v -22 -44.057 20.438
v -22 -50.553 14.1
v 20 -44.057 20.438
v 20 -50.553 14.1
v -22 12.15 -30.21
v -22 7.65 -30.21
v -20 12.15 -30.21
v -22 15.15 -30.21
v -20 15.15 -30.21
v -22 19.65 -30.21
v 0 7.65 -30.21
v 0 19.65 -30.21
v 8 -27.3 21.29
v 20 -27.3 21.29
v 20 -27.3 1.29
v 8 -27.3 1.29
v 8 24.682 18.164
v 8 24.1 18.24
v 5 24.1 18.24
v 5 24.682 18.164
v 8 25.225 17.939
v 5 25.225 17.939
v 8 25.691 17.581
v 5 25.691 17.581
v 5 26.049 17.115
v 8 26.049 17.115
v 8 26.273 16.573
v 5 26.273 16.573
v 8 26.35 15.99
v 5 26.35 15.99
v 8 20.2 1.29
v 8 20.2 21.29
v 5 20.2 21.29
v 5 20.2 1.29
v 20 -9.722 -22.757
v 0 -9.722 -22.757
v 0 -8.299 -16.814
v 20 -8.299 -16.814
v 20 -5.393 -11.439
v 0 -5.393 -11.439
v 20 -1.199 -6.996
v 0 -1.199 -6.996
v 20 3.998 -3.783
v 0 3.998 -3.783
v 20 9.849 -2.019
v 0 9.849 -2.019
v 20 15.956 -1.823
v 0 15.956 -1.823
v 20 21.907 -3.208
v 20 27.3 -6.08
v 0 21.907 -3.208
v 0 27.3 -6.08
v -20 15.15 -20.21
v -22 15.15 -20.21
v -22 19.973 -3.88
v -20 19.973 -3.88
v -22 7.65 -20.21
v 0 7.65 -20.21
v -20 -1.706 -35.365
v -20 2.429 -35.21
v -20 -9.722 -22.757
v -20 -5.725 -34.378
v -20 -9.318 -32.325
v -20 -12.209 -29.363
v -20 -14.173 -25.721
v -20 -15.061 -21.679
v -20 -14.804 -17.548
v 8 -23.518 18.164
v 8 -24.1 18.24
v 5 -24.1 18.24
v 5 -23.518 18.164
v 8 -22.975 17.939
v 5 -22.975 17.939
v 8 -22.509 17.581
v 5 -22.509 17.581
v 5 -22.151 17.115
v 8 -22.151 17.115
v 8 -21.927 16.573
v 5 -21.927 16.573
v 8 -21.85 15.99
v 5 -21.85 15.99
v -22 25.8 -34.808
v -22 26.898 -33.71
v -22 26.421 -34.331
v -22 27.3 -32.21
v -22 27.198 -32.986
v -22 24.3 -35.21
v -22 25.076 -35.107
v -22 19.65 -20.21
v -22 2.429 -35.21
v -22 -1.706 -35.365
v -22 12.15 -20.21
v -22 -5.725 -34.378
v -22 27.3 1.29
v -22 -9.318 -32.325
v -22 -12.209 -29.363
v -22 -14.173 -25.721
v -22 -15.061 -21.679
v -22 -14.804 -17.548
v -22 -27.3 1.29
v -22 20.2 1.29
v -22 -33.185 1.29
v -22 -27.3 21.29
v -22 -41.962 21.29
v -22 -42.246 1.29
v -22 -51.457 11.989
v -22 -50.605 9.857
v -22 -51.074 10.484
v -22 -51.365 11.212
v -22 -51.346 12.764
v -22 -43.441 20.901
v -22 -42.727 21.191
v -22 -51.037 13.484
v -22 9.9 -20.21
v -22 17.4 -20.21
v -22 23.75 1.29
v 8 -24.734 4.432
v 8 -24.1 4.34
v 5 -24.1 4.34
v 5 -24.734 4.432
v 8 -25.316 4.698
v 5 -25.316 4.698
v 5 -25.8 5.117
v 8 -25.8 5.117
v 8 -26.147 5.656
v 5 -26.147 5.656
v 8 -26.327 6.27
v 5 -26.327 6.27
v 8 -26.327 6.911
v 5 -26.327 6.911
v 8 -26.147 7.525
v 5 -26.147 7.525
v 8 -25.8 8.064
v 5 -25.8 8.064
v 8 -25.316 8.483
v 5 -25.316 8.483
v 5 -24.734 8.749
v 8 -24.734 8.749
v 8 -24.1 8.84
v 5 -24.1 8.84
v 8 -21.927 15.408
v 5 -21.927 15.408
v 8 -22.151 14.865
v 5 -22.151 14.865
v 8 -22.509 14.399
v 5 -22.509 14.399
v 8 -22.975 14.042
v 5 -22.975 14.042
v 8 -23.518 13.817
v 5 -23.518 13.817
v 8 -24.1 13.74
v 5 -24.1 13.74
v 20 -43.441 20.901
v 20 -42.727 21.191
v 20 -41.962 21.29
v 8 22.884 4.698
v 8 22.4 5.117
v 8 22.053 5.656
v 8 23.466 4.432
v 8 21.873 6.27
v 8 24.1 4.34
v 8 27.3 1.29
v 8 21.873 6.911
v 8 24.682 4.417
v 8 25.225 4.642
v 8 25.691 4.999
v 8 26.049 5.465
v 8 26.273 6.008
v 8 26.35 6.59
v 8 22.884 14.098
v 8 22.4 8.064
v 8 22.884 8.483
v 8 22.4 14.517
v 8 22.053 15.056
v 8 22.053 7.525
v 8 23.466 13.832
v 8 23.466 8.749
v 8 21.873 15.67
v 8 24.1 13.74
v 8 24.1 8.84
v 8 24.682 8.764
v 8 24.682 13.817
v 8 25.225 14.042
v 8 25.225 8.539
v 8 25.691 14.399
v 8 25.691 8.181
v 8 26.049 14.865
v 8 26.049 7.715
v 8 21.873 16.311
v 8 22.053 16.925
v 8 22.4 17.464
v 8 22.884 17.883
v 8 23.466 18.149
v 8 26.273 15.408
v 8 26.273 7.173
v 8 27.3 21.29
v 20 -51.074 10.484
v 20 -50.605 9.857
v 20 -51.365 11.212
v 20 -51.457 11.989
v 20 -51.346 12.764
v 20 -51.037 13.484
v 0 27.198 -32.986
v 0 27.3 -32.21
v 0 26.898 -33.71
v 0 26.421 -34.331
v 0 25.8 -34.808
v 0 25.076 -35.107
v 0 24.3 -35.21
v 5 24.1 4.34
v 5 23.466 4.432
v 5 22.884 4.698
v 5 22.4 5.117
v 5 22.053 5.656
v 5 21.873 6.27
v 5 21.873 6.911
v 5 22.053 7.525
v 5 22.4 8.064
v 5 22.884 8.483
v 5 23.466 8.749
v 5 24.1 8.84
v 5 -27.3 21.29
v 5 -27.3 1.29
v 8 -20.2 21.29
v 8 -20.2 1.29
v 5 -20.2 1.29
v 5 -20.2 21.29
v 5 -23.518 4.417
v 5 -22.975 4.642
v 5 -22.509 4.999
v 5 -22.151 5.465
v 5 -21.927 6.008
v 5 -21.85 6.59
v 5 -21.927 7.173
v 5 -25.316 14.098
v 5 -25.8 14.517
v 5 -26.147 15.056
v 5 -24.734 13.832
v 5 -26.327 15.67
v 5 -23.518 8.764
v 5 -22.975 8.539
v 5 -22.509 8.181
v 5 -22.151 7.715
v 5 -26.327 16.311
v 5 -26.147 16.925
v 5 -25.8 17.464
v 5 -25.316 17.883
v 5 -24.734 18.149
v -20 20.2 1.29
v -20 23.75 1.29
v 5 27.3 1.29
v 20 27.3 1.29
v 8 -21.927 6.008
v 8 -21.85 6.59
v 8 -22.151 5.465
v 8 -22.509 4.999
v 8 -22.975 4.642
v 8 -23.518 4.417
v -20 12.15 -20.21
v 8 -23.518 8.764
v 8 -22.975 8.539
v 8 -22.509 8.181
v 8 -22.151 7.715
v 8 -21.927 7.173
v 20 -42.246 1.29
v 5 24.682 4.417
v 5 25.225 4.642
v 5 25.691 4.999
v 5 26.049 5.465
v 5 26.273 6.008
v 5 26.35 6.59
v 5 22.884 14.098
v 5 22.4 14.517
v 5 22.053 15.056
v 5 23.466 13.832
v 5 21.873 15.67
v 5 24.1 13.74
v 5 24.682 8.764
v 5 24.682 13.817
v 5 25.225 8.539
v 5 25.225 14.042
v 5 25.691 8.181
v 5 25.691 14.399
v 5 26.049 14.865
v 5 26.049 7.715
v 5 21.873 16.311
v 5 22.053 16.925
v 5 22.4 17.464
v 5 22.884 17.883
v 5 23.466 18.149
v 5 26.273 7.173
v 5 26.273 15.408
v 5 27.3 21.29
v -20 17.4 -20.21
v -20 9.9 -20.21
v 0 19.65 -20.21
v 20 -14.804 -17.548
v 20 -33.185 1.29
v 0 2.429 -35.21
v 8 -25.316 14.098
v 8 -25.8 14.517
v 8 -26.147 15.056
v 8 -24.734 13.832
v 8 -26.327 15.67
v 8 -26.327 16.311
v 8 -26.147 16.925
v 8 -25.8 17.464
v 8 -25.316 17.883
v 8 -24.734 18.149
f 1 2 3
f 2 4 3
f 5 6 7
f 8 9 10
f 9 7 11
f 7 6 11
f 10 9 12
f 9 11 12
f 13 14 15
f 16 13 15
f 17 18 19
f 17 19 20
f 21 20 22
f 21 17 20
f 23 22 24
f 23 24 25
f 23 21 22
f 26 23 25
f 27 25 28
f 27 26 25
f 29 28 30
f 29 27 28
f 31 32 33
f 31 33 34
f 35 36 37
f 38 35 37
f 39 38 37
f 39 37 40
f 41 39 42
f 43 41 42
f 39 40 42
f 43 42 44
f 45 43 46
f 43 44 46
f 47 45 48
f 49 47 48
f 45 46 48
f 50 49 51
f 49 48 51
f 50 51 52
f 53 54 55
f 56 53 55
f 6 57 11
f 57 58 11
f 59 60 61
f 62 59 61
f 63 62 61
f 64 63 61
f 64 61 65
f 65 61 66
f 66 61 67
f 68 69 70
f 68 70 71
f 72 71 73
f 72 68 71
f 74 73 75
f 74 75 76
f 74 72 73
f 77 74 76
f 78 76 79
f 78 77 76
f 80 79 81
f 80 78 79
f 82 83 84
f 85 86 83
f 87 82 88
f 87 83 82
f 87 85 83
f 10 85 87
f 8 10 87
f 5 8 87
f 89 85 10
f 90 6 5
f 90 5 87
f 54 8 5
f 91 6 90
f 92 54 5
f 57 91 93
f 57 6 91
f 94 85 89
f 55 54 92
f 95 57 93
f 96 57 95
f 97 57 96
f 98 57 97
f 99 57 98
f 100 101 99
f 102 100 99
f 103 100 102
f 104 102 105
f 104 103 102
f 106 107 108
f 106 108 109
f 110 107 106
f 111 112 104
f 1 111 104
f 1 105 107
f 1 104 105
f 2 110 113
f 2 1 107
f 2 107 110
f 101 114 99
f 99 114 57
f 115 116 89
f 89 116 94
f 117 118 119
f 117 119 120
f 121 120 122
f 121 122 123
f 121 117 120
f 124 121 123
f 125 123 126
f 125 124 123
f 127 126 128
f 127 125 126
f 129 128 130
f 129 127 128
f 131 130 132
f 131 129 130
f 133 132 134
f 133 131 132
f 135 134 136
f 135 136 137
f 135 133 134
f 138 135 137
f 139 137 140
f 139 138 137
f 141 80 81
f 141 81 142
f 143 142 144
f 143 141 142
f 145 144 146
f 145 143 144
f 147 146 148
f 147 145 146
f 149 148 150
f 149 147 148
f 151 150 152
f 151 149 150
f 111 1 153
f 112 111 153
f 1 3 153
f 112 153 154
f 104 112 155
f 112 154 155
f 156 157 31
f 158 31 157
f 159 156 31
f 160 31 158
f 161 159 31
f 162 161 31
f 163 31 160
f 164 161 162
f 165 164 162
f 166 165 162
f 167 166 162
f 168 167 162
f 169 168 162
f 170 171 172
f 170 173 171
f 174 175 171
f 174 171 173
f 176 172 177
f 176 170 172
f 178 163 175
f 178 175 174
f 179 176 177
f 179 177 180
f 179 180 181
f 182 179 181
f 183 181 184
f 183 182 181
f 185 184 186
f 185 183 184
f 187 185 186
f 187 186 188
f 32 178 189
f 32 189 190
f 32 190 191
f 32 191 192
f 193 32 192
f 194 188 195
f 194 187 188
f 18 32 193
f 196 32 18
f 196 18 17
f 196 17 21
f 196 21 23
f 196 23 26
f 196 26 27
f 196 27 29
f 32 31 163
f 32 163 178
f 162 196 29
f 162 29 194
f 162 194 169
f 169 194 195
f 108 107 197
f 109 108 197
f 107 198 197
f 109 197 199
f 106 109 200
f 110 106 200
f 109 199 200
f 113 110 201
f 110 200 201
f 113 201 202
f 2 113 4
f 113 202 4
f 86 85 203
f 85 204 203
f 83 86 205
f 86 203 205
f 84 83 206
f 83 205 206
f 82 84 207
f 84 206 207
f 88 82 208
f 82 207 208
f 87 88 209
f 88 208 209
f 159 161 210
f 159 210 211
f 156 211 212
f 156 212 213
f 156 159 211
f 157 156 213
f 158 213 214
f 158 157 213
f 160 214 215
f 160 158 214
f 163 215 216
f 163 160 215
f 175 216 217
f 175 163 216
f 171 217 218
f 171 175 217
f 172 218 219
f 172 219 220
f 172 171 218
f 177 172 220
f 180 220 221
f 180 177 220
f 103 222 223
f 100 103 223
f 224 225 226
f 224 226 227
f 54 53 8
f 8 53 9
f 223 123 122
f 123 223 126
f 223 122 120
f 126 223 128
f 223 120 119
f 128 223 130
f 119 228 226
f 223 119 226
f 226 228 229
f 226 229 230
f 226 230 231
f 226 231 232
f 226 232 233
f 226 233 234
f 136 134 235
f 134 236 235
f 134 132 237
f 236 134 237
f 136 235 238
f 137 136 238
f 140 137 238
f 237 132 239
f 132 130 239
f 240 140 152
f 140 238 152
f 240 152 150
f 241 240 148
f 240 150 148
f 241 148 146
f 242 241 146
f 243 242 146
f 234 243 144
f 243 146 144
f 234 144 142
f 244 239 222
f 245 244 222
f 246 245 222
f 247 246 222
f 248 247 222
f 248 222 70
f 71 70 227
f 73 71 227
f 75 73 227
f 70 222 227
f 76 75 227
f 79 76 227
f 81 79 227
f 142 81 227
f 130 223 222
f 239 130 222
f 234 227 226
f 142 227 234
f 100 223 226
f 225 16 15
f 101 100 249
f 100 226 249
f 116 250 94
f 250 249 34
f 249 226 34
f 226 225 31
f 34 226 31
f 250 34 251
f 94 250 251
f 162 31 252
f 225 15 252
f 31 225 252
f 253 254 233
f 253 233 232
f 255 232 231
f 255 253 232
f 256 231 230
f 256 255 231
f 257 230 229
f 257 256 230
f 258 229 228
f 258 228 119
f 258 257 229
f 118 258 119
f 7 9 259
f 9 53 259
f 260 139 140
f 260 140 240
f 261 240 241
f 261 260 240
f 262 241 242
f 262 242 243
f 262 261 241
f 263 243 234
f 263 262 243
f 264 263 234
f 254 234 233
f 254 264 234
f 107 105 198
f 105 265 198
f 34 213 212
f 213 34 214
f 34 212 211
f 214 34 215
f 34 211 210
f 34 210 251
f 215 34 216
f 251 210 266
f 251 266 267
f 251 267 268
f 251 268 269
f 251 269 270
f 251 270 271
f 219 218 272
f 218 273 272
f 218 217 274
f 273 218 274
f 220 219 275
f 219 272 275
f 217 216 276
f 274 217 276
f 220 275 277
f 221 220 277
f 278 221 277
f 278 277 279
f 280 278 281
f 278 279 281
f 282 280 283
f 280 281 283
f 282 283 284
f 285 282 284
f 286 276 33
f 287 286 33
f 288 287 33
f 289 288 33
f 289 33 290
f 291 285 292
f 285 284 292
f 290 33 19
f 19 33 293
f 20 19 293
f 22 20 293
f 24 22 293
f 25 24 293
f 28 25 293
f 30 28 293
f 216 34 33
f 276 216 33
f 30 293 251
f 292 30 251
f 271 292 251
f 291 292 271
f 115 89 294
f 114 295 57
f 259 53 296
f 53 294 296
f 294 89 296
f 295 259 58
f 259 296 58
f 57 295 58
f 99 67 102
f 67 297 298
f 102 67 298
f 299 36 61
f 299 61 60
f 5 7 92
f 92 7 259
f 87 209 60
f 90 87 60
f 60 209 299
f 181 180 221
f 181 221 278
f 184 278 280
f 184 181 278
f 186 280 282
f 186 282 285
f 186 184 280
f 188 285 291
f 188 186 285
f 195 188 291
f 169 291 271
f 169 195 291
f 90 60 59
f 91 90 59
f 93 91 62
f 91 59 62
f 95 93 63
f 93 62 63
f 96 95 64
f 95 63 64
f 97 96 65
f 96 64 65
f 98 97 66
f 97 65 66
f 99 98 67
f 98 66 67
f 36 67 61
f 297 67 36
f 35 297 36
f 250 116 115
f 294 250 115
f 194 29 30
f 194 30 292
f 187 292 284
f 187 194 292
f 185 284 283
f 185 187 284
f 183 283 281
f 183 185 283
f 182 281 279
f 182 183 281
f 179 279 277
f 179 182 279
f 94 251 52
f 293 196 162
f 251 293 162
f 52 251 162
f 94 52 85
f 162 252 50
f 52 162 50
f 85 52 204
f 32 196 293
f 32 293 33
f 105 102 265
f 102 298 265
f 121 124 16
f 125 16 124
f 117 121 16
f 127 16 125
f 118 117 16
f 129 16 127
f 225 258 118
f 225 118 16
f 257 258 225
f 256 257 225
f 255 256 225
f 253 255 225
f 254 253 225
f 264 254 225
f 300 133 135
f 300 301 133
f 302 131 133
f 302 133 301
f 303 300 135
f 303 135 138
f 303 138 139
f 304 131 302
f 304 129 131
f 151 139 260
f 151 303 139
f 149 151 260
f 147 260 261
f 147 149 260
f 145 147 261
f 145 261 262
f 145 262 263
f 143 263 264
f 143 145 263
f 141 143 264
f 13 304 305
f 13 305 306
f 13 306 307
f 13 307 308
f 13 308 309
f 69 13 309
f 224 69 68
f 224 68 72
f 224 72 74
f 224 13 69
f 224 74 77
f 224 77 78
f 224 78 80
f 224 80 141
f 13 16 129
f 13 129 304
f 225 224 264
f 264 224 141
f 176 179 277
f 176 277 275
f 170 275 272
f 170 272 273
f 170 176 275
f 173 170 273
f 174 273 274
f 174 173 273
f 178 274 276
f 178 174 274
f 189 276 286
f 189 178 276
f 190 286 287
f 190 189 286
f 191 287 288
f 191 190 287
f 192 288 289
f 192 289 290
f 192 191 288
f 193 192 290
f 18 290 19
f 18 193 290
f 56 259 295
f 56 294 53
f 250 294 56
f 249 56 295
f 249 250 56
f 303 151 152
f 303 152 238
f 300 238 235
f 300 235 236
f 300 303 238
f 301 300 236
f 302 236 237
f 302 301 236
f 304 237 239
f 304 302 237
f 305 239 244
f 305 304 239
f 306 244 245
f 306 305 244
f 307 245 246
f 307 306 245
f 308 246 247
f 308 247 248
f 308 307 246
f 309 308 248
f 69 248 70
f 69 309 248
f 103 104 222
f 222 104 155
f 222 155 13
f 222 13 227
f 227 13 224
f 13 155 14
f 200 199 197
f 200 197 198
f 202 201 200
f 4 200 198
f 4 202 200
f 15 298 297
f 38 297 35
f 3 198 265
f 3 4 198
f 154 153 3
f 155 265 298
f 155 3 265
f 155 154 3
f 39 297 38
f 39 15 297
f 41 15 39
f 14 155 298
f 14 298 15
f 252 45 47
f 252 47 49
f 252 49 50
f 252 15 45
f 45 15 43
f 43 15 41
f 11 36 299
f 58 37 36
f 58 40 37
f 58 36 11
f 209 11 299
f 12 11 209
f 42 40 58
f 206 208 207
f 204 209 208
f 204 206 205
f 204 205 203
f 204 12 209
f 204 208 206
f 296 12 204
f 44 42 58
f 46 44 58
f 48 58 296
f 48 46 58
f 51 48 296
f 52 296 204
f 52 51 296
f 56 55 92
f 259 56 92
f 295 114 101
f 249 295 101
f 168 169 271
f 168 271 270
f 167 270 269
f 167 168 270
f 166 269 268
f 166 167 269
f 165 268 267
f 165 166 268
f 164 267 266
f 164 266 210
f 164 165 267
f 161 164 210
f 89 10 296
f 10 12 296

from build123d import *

# Parameters (mm, degrees)
F1_DEPTH  = 20
F0_W      = 12
F0_H      = 10
F2_DEPTH  = 20
F4_DEPTH  = 2
F8_DEPTH  = 3
F10_DEPTH = 2


with BuildPart() as f1:
    # F0 (on Right) → F1 (new body)
    with BuildSketch(Plane.YZ):
        with BuildLine():
            ThreePointArc((-9.7216395426, -22.7567306352), (3.9984194059, -3.7830302321), (27.3, -6.0803474404))
            Line((27.3, -6.0803474404), (27.3, 1.2904210016))
            Line((27.3, 1.2904210016), (20.2, 1.2904210016))
            Line((20.2, 1.2904210016), (-20.2, 1.2904210016))
            Line((-20.2, 1.2904210016), (-27.3, 1.2904210016))
            Line((-27.3, 1.2904210016), (-33.1852941176, 1.2904210016))
            Line((-33.1852941176, 1.2904210016), (-14.8038696072, -17.5481150452))
            Line((-14.8038696072, -17.5481150452), (-9.7216395426, -22.7567306352))
        make_face()
        with BuildLine():
            Line((-42.245950674, 1.2904210016), (-33.1852941176, 1.2904210016))
            Line((-33.1852941176, 1.2904210016), (-27.3, 1.2904210016))
            Line((-27.3, 1.2904210016), (-27.3, 21.2904210016))
            Line((-27.3, 21.2904210016), (-41.9619835647, 21.2904210016))
            ThreePointArc((-41.9619835647, 21.2904210016), (-43.092993443, 21.0690567559), (-44.0570932222, 20.4376321051))
            Line((-44.0570932222, 20.4376321051), (-50.5527888965, 14.0995525758))
            ThreePointArc((-50.5527888965, 14.0995525758), (-51.4574530171, 11.989182758), (-50.6048903424, 9.8572318148))
            Line((-50.6048903424, 9.8572318148), (-42.245950674, 1.2904210016))
        make_face()
    extrude(amount=F1_DEPTH)

    # F0 (on Right) → F2 (join)
    with BuildSketch(Plane.YZ):
        with BuildLine():
            ThreePointArc((-9.7216395426, -22.7567306352), (3.9984194059, -3.7830302321), (27.3, -6.0803474404))
            Line((27.3, -6.0803474404), (27.3, 1.2904210016))
            Line((27.3, 1.2904210016), (20.2, 1.2904210016))
            Line((20.2, 1.2904210016), (-20.2, 1.2904210016))
            Line((-20.2, 1.2904210016), (-27.3, 1.2904210016))
            Line((-27.3, 1.2904210016), (-33.1852941176, 1.2904210016))
            Line((-33.1852941176, 1.2904210016), (-14.8038696072, -17.5481150452))
            Line((-14.8038696072, -17.5481150452), (-9.7216395426, -22.7567306352))
        make_face()
        with BuildLine():
            ThreePointArc((24.3, -35.2095789984), (26.4213203436, -34.3308993419), (27.3, -32.2095789984))
            Line((27.3, -32.2095789984), (27.3, -6.0803474404))
            ThreePointArc((27.3, -6.0803474404), (3.9984194059, -3.7830302321), (-9.7216395426, -22.7567306352))
            Line((-9.7216395426, -22.7567306352), (2.4290441176, -35.2095789984))
            Line((2.4290441176, -35.2095789984), (24.3, -35.2095789984))
        make_face()
        with Locations((13.65, -25.2095789984)):
            Rectangle(F0_W, F0_H, mode=Mode.SUBTRACT)
        with BuildLine():
            Line((-42.245950674, 1.2904210016), (-33.1852941176, 1.2904210016))
            Line((-33.1852941176, 1.2904210016), (-27.3, 1.2904210016))
            Line((-27.3, 1.2904210016), (-27.3, 21.2904210016))
            Line((-27.3, 21.2904210016), (-41.9619835647, 21.2904210016))
            ThreePointArc((-41.9619835647, 21.2904210016), (-43.092993443, 21.0690567559), (-44.0570932222, 20.4376321051))
            Line((-44.0570932222, 20.4376321051), (-50.5527888965, 14.0995525758))
            ThreePointArc((-50.5527888965, 14.0995525758), (-51.4574530171, 11.989182758), (-50.6048903424, 9.8572318148))
            Line((-50.6048903424, 9.8572318148), (-42.245950674, 1.2904210016))
        make_face()
    extrude(amount=-F2_DEPTH)

    # F3 (on face) → F4 (join)
    with BuildSketch(Plane(origin=(-20, 0, 0), x_dir=(0, -1, 0), z_dir=(-1, 0, 0))):
        with BuildLine():
            Line((-2.4290441176, -35.2095789984), (14.8038696072, -17.5481150452))
            Line((14.8038696072, -17.5481150452), (33.1852941176, 1.2904210016))
            Line((33.1852941176, 1.2904210016), (42.245950674, 1.2904210016))
            Line((42.245950674, 1.2904210016), (50.6048903424, 9.8572318148))
            ThreePointArc((50.6048903424, 9.8572318148), (51.4574530171, 11.989182758), (50.5527888965, 14.0995525758))
            Line((50.5527888965, 14.0995525758), (44.0570932222, 20.4376321051))
            ThreePointArc((44.0570932222, 20.4376321051), (43.092993443, 21.0690567559), (41.9619835647, 21.2904210016))
            Line((41.9619835647, 21.2904210016), (27.3, 21.2904210016))
            Line((27.3, 21.2904210016), (27.3, 1.2904210016))
            Line((27.3, 1.2904210016), (-27.3, 1.2904210016))
            Line((-27.3, 1.2904210016), (-27.3, -32.2095789984))
            ThreePointArc((-27.3, -32.2095789984), (-26.4213203436, -34.3308993419), (-24.3, -35.2095789984))
            Line((-24.3, -35.2095789984), (-2.4290441176, -35.2095789984))
        make_face()
        Polygon((-19.65, -30.2095789984), (-19.65, -20.2095789984), (-15.15, -20.2095789984), (-13.65, -20.2095789984), (-12.15, -20.2095789984), (-7.65, -20.2095789984), (-7.65, -30.2095789984), (-12.15, -30.2095789984), (-15.15, -30.2095789984), align=None, mode=Mode.SUBTRACT)
        with BuildLine():
            ThreePointArc((-2.4290441176, -35.2095789984), (10.8667381723, -30.9446299941), (14.8038696072, -17.5481150452))
            Line((14.8038696072, -17.5481150452), (-2.4290441176, -35.2095789984))
        make_face()
        Polygon((-13.65, -20.2095789984), (-15.15, -20.2095789984), (-15.15, -30.2095789984), (-12.15, -30.2095789984), (-12.15, -20.2095789984), align=None)
    extrude(amount=F4_DEPTH)

    # F7 (on offset) → F8 (join)
    with BuildSketch(Plane.YZ.offset(8)):
        with BuildLine():
            Line((-24.1, 21.2904210016), (-27.3, 21.2904210016))
            Line((-27.3, 21.2904210016), (-27.3, 1.2904210016))
            Line((-27.3, 1.2904210016), (-24.1, 1.2904210016))
            Line((-24.1, 1.2904210016), (-24.1, 4.3404210016))
            ThreePointArc((-24.1, 4.3404210016), (-26.35, 6.5904210016), (-24.1, 8.8404210016))
            Line((-24.1, 8.8404210016), (-24.1, 13.7404210016))
            ThreePointArc((-24.1, 13.7404210016), (-26.35, 15.9904210016), (-24.1, 18.2404210016))
            Line((-24.1, 18.2404210016), (-24.1, 21.2904210016))
        make_face()
        with BuildLine():
            Line((-20.2, 21.2904210016), (-24.1, 21.2904210016))
            Line((-24.1, 21.2904210016), (-24.1, 18.2404210016))
            ThreePointArc((-24.1, 18.2404210016), (-22.5090097423, 17.5814112593), (-21.85, 15.9904210016))
            ThreePointArc((-21.85, 15.9904210016), (-22.5090097423, 14.3994307439), (-24.1, 13.7404210016))
            Line((-24.1, 13.7404210016), (-24.1, 8.8404210016))
            ThreePointArc((-24.1, 8.8404210016), (-22.5090097423, 8.1814112593), (-21.85, 6.5904210016))
            ThreePointArc((-21.85, 6.5904210016), (-22.5090097423, 4.9994307439), (-24.1, 4.3404210016))
            Line((-24.1, 4.3404210016), (-24.1, 1.2904210016))
            Line((-24.1, 1.2904210016), (-20.2, 1.2904210016))
            Line((-20.2, 1.2904210016), (-20.2, 21.2904210016))
        make_face()
        with BuildLine():
            Line((20.2, 21.2904210016), (20.2, 1.2904210016))
            Line((20.2, 1.2904210016), (24.1, 1.2904210016))
            Line((24.1, 1.2904210016), (24.1, 4.3404210016))
            ThreePointArc((24.1, 4.3404210016), (21.85, 6.5904210016), (24.1, 8.8404210016))
            Line((24.1, 8.8404210016), (24.1, 13.7404210016))
            ThreePointArc((24.1, 13.7404210016), (21.85, 15.9904210016), (24.1, 18.2404210016))
            Line((24.1, 18.2404210016), (24.1, 21.2904210016))
            Line((24.1, 21.2904210016), (20.2, 21.2904210016))
        make_face()
        with BuildLine():
            Line((24.1, 4.3404210016), (24.1, 1.2904210016))
            Line((24.1, 1.2904210016), (27.3, 1.2904210016))
            Line((27.3, 1.2904210016), (27.3, 21.2904210016))
            Line((27.3, 21.2904210016), (24.1, 21.2904210016))
            Line((24.1, 21.2904210016), (24.1, 18.2404210016))
            ThreePointArc((24.1, 18.2404210016), (25.6909902577, 17.5814112593), (26.35, 15.9904210016))
            ThreePointArc((26.35, 15.9904210016), (25.6909902577, 14.3994307439), (24.1, 13.7404210016))
            Line((24.1, 13.7404210016), (24.1, 8.8404210016))
            ThreePointArc((24.1, 8.8404210016), (25.6909902577, 8.1814112593), (26.35, 6.5904210016))
            ThreePointArc((26.35, 6.5904210016), (25.6909902577, 4.9994307439), (24.1, 4.3404210016))
        make_face()
    extrude(amount=-F8_DEPTH)

    # F9 (on face) → F10 (cut)
    with BuildSketch(Plane(origin=(-22, 0, 0), x_dir=(0, -1, 0), z_dir=(-1, 0, 0))):
        Polygon((-19.9727848101, -3.8804650743), (-12.15, -20.2095789984), (-9.9, -20.2095789984), (-20.2, 1.2904210016), (-23.75, 1.2904210016), (-17.4, -20.2095789984), (-15.15, -20.2095789984), align=None)
    extrude(amount=-F10_DEPTH, mode=Mode.SUBTRACT)


solid = f1.part
